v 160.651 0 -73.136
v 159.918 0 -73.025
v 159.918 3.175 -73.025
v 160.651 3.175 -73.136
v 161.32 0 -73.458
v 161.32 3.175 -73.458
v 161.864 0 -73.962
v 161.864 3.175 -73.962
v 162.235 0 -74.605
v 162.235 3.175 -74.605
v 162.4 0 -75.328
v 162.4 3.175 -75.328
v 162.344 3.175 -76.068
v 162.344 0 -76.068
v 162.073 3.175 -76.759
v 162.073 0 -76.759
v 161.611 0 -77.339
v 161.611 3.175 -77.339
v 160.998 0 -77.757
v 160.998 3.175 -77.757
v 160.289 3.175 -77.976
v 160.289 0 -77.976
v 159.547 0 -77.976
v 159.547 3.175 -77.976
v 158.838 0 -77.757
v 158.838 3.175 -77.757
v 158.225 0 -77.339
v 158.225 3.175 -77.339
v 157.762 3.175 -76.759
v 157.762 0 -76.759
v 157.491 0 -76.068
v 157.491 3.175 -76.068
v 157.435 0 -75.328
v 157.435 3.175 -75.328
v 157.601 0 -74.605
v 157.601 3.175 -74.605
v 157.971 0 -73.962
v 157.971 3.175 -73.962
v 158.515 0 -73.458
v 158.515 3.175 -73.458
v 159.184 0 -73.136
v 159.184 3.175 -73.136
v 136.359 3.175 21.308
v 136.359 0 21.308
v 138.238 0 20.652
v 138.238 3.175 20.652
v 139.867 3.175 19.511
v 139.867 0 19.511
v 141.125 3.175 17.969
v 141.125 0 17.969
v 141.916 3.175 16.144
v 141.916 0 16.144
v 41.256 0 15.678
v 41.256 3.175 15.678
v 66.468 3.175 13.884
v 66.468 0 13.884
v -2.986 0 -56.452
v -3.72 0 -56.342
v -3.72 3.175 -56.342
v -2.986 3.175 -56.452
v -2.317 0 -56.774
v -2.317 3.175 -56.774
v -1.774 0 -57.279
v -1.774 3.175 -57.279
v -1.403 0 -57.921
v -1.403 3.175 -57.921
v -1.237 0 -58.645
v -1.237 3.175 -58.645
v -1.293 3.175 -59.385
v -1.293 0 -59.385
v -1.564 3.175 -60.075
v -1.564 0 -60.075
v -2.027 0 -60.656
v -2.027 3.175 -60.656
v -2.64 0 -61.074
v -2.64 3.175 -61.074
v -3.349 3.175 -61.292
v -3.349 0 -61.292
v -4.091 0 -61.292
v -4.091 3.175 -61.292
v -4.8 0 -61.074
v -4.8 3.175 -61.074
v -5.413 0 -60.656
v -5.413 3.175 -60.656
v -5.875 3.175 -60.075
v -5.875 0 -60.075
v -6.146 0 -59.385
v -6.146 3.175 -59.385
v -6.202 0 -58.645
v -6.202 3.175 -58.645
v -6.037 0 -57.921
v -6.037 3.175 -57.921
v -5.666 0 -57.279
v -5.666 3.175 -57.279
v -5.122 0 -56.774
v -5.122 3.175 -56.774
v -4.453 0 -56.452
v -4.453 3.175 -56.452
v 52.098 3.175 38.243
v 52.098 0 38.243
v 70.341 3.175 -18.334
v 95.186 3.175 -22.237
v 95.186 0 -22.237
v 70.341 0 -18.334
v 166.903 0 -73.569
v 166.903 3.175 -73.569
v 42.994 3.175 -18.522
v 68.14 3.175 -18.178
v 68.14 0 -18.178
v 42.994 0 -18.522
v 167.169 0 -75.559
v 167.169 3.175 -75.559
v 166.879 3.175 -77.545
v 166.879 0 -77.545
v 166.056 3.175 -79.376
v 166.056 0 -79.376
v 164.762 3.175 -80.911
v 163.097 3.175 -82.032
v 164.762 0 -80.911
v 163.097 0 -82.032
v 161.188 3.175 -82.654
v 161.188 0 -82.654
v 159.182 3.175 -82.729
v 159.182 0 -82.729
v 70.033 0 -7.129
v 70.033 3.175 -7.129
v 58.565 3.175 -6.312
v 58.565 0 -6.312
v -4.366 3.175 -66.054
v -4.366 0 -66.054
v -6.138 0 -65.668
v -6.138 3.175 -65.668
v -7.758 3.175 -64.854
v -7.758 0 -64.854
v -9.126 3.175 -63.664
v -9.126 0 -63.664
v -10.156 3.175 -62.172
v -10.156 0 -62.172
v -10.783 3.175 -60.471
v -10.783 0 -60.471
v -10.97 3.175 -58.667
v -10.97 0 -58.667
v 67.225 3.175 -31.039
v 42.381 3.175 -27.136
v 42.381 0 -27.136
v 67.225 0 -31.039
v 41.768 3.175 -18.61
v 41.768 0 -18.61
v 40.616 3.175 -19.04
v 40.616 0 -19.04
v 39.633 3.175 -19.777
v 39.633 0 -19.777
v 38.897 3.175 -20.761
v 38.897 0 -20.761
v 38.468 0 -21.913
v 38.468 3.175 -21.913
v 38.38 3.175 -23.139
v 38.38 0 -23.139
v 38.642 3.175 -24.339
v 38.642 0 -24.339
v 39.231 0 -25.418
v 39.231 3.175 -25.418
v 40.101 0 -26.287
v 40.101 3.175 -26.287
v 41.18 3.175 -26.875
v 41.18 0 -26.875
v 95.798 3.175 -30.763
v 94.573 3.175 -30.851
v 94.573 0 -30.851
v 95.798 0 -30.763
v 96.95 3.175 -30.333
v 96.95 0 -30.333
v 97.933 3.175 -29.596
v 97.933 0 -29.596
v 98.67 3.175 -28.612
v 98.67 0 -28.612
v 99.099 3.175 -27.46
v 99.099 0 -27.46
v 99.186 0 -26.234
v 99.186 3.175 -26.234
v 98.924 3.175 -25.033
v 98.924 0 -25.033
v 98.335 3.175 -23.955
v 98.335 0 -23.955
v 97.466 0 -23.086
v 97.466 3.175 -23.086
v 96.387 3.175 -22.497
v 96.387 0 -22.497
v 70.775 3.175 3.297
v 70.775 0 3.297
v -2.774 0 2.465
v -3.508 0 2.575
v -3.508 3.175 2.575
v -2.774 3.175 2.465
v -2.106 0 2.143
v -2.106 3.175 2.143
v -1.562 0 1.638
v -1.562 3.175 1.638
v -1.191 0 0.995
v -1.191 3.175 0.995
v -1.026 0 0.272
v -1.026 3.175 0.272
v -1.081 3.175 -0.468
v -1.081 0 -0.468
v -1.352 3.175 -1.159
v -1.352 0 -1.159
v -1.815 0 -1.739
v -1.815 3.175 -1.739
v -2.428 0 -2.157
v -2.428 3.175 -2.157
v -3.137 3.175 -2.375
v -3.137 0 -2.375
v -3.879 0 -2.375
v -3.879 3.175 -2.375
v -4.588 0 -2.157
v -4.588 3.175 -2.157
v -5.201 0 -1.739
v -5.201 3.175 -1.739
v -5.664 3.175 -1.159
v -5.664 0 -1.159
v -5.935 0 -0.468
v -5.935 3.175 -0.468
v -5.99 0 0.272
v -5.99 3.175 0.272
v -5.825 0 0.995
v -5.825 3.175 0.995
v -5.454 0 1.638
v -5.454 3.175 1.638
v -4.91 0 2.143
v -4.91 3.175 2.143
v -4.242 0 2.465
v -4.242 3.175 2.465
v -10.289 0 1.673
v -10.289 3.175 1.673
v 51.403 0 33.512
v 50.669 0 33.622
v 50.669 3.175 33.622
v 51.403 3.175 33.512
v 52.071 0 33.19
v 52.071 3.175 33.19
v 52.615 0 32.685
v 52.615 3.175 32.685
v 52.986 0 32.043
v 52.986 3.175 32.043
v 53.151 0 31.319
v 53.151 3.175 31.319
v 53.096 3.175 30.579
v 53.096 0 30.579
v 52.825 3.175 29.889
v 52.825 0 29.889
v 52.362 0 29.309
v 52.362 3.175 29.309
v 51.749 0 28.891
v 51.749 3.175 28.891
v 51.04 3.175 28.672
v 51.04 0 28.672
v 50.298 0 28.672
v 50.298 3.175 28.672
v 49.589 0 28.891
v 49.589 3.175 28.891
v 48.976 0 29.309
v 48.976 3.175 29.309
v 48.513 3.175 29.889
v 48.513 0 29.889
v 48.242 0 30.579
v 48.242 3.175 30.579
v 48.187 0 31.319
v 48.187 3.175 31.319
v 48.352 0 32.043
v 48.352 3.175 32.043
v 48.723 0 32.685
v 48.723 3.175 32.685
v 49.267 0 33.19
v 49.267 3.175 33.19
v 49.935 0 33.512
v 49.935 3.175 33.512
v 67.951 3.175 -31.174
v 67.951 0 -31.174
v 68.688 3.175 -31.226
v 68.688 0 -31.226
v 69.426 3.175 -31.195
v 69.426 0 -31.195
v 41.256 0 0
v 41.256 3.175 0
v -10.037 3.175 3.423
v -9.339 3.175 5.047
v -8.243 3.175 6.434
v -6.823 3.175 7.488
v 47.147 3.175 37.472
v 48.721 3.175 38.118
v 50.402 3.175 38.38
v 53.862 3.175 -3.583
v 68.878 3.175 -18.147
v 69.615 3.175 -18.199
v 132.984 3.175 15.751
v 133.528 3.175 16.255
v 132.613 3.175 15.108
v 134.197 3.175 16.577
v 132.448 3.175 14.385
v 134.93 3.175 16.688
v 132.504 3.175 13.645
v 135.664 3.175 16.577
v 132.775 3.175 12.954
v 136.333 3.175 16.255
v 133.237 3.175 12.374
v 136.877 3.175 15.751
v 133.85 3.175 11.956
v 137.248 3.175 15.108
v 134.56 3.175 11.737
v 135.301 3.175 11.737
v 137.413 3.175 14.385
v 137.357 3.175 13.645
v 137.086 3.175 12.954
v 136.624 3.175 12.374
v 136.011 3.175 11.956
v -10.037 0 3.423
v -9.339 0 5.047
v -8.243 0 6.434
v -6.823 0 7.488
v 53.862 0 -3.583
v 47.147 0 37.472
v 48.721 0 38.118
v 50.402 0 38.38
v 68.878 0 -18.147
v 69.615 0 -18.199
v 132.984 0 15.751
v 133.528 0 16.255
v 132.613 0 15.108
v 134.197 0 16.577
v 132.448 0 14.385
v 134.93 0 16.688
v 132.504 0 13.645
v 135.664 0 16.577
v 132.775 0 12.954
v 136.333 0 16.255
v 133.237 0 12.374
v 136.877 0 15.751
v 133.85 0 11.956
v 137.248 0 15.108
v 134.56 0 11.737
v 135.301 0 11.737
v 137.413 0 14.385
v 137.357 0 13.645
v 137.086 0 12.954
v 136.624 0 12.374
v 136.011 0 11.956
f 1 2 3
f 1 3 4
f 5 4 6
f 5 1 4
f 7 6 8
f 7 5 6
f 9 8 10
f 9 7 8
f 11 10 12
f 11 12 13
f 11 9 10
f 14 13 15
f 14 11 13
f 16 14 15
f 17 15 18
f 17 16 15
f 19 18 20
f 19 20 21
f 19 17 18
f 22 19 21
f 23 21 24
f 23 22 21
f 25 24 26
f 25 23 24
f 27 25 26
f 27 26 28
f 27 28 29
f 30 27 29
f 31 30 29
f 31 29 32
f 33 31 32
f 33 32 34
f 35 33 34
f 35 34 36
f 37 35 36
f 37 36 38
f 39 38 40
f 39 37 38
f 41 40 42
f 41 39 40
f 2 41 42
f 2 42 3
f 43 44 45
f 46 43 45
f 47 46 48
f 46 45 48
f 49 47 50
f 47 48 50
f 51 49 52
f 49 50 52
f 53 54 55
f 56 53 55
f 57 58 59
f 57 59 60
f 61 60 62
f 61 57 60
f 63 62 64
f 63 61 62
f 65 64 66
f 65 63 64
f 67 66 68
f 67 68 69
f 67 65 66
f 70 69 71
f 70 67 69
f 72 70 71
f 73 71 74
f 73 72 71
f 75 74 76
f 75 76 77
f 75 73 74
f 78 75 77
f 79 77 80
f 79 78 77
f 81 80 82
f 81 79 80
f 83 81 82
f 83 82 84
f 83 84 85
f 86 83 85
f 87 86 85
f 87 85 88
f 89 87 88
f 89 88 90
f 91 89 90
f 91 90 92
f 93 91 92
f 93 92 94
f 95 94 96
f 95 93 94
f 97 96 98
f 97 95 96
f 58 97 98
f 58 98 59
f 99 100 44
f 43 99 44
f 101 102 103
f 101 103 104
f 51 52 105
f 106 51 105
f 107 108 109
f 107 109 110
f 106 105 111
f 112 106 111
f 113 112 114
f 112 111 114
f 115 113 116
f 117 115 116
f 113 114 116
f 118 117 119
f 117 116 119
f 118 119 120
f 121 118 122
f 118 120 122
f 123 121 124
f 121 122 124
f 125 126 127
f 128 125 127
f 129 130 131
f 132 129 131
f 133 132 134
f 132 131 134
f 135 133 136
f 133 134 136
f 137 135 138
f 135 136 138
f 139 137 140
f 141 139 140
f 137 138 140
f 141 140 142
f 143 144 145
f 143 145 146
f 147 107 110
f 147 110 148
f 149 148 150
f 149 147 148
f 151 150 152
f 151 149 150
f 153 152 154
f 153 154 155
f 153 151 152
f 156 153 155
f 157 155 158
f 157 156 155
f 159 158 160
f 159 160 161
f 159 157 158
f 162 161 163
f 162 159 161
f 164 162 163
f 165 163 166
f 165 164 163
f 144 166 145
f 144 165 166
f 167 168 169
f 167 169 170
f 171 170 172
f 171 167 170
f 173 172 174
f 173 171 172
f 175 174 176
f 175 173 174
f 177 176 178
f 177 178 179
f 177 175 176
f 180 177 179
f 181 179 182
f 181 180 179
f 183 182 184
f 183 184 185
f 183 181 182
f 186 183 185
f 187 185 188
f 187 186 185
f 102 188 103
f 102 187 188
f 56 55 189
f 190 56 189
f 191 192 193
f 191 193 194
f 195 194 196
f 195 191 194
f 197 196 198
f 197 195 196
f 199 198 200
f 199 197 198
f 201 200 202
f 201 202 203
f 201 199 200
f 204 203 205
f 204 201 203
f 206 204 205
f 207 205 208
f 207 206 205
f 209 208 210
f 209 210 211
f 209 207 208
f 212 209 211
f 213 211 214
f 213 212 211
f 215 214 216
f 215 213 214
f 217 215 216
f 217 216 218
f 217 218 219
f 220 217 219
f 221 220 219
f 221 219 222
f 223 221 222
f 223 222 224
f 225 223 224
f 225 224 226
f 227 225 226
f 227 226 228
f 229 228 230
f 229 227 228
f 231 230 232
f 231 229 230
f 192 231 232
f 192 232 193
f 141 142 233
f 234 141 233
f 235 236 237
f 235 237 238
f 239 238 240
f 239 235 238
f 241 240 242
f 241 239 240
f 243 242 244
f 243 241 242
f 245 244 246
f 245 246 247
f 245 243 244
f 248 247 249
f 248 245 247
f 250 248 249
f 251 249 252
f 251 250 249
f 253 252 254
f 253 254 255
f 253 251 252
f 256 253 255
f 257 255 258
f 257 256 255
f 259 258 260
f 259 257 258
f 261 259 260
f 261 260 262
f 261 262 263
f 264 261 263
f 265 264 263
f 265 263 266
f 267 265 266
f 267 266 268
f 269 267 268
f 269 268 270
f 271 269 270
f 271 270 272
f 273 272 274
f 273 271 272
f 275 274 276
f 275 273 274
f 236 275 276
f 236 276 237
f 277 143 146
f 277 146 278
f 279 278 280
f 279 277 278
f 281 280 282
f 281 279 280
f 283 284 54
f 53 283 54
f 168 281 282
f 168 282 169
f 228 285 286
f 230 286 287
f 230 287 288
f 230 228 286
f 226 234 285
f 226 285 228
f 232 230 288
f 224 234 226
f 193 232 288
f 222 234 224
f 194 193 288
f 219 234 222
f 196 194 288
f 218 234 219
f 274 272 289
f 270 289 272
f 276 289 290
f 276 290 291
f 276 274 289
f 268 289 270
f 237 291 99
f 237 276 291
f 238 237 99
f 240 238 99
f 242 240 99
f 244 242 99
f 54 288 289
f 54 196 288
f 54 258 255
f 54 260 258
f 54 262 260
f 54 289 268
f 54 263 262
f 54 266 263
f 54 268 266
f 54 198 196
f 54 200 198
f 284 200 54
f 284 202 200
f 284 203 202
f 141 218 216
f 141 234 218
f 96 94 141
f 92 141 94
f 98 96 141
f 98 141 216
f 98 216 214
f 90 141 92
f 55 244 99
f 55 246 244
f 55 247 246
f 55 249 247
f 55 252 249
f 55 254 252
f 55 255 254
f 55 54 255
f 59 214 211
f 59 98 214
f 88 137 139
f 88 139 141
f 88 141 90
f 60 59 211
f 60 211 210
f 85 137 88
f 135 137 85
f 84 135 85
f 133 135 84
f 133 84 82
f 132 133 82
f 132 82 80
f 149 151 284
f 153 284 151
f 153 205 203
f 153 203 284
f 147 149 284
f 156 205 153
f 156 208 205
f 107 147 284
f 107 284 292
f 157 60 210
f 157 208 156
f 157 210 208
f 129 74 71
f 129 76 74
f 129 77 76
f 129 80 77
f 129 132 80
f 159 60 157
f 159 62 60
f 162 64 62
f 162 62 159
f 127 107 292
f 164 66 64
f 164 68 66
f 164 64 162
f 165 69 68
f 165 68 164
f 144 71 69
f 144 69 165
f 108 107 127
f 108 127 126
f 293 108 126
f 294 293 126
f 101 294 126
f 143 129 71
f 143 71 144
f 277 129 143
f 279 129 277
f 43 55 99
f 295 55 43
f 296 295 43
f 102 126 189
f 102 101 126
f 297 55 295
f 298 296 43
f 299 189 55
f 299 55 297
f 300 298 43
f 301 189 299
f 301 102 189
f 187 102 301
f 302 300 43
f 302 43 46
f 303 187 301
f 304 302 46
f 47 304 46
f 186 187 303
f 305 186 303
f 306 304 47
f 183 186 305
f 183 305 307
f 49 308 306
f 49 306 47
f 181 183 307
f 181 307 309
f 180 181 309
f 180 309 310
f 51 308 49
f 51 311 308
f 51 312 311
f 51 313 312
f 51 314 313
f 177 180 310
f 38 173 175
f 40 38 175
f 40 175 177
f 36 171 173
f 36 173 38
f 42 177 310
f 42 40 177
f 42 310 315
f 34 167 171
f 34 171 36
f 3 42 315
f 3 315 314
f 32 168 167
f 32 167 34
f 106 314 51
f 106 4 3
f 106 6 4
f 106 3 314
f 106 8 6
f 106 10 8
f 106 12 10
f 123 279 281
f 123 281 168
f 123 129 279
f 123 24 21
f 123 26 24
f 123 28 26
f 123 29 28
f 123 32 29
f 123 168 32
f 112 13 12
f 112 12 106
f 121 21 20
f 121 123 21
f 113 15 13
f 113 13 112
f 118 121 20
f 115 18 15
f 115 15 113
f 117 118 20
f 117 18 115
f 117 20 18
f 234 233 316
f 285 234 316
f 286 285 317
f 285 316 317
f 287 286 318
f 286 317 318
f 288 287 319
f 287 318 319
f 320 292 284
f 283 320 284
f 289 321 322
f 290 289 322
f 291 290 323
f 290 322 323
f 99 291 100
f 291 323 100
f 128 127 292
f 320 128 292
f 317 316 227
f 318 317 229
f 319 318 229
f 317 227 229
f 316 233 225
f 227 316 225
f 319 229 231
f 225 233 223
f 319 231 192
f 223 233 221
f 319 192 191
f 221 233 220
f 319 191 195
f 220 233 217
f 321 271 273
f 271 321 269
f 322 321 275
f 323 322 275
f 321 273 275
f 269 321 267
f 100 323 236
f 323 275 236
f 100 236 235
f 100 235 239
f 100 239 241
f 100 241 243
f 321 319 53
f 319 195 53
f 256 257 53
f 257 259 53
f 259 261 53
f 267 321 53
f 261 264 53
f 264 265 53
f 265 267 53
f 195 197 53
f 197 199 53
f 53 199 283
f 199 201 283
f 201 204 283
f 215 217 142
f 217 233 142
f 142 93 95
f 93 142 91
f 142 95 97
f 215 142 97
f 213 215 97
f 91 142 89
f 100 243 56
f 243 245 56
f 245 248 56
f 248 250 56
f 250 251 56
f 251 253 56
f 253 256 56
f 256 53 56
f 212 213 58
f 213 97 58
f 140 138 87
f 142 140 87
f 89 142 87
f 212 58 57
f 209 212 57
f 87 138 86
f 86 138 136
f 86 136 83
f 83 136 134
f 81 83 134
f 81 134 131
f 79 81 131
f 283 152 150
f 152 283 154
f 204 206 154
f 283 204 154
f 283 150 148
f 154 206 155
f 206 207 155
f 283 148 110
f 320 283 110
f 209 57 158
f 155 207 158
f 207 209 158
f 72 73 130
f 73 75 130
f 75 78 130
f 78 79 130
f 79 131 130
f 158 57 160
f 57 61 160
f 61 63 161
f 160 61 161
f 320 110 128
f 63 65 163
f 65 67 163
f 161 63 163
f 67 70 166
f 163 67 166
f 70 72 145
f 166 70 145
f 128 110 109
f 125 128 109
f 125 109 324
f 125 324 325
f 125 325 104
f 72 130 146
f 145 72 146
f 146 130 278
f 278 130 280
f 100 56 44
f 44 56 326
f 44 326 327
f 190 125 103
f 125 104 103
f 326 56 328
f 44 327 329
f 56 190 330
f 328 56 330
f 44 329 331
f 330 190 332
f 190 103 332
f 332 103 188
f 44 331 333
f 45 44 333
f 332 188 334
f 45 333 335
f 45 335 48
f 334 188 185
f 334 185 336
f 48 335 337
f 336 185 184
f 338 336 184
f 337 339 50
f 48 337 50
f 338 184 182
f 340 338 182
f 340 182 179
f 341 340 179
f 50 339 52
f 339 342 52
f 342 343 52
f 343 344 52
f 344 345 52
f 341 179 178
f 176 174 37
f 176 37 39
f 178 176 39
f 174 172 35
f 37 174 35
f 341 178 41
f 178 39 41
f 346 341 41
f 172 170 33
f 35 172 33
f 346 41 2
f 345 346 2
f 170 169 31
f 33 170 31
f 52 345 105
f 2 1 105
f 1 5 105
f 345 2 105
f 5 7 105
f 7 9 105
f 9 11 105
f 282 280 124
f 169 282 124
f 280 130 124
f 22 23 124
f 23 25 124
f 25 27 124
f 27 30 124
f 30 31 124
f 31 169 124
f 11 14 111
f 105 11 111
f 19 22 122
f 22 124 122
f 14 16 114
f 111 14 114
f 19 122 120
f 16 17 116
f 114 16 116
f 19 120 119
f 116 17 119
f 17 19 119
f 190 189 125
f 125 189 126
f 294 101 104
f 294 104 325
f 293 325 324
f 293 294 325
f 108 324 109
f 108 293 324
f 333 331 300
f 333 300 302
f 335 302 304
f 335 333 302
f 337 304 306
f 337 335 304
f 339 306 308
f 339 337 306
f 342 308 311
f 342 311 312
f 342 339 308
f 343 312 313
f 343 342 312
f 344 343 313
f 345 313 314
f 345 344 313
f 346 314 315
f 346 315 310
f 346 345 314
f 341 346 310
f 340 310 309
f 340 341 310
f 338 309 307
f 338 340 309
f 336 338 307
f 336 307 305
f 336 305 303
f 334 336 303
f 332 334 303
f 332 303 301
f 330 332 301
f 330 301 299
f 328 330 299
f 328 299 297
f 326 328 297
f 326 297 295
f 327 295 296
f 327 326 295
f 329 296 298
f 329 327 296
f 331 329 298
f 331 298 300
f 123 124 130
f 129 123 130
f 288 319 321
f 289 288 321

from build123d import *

# Parameters (mm, degrees)
SKETCH1_R            = 2.4892
BOSS_EXTRUDE1_DEPTH  = 3.175
TRIGGER_CUTOUT_DEPTH = 3.175
SERVO_CUTOUT_DEPTH   = 3.175


with BuildPart() as part:
    # Sketch1 → Boss-Extrude1 (new body)
    with BuildSketch(Plane(origin=(0, 0, 0), x_dir=(1, 0, 0), z_dir=(0, 1, 0))):
        with BuildLine():
            Line((-6.8229868, -7.488197853), (47.14701474, -37.472309865))
            ThreePointArc((47.14701474, -37.472309865), (49.553689318, -38.298669515), (52.097667916, -38.242761734))
            Line((52.097667916, -38.242761734), (136.359344262, -21.308190288))
            ThreePointArc((136.359344262, -21.308190288), (139.866879533, -19.510833837), (141.916296901, -16.144354617))
            Line((141.916296901, -16.144354617), (166.90343399, 73.568749369))
            ThreePointArc((166.90343399, 73.568749369), (165.462253091, 80.188248266), (159.182077212, 82.728751949))
            Line((159.182077212, 82.728751949), (-4.366145722, 66.053653766))
            ThreePointArc((-4.366145722, 66.053653766), (-9.125920254, 63.663982971), (-10.969503308, 58.667265887))
            Line((-10.969503308, 58.667265887), (-10.288924124, -1.672992978))
            ThreePointArc((-10.288924124, -1.672992978), (-9.33910622, -5.047363397), (-6.8229868, -7.488197853))
        make_face()
        with Locations(Location((159.917634832, 75.514453101, 0), (0, 0, 270))):
            Circle(SKETCH1_R, mode=Mode.SUBTRACT)
        with Locations(Location((134.930497743, -14.198650885, 0), (0, 0, 270))):
            Circle(SKETCH1_R, mode=Mode.SUBTRACT)
        with Locations(Location((50.668821397, -31.133222331, 0), (0, 0, 270))):
            Circle(SKETCH1_R, mode=Mode.SUBTRACT)
        with Locations(Location((-3.719648143, 58.830829265, 0), (0, 0, 270))):
            Circle(SKETCH1_R, mode=Mode.SUBTRACT)
        with Locations(Location((-3.508126319, -0.086017173, 0), (0, 0, 270))):
            Circle(SKETCH1_R, mode=Mode.SUBTRACT)
    extrude(amount=BOSS_EXTRUDE1_DEPTH)

    # Sketch3 → trigger cutout (cut)
    with BuildSketch(Plane(origin=(0, 3.175, 0), x_dir=(1, 0, 0), z_dir=(0, 1, 0))):
        Polygon((41.255934536, -15.678441329), (66.468104622, -13.883980824), (70.774809833, -3.296663849), (70.032795293, 7.128640439), (58.56546888, 6.312460623), (53.862019579, 3.583115238), (41.255934536, 0), align=None)
    extrude(amount=-TRIGGER_CUTOUT_DEPTH, mode=Mode.SUBTRACT)

    # Sketch4 → servo cutout (cut)
    with BuildSketch(Plane(origin=(0, 3.175, 0), x_dir=(1, 0, 0), z_dir=(0, 1, 0))):
        with BuildLine():
            Line((69.425949058, 31.19523761), (94.572562087, 30.850872889))
            ThreePointArc((94.572562087, 30.850872889), (99.186221889, 26.850324024), (95.185673024, 22.236664221))
            Line((95.185673024, 22.236664221), (70.3413237, 18.334223888))
            ThreePointArc((70.3413237, 18.334223888), (69.247473844, 18.162406798), (68.140315886, 18.177568527))
            Line((68.140315886, 18.177568527), (42.993702858, 18.521933248))
            ThreePointArc((42.993702858, 18.521933248), (38.380043055, 22.522482114), (42.380591921, 27.136141916))
            Line((42.380591921, 27.136141916), (67.224941244, 31.03858225))
            ThreePointArc((67.224941244, 31.03858225), (68.318791101, 31.210399339), (69.425949058, 31.19523761))
        make_face()
    extrude(amount=-SERVO_CUTOUT_DEPTH, mode=Mode.SUBTRACT)


solid = part.part
